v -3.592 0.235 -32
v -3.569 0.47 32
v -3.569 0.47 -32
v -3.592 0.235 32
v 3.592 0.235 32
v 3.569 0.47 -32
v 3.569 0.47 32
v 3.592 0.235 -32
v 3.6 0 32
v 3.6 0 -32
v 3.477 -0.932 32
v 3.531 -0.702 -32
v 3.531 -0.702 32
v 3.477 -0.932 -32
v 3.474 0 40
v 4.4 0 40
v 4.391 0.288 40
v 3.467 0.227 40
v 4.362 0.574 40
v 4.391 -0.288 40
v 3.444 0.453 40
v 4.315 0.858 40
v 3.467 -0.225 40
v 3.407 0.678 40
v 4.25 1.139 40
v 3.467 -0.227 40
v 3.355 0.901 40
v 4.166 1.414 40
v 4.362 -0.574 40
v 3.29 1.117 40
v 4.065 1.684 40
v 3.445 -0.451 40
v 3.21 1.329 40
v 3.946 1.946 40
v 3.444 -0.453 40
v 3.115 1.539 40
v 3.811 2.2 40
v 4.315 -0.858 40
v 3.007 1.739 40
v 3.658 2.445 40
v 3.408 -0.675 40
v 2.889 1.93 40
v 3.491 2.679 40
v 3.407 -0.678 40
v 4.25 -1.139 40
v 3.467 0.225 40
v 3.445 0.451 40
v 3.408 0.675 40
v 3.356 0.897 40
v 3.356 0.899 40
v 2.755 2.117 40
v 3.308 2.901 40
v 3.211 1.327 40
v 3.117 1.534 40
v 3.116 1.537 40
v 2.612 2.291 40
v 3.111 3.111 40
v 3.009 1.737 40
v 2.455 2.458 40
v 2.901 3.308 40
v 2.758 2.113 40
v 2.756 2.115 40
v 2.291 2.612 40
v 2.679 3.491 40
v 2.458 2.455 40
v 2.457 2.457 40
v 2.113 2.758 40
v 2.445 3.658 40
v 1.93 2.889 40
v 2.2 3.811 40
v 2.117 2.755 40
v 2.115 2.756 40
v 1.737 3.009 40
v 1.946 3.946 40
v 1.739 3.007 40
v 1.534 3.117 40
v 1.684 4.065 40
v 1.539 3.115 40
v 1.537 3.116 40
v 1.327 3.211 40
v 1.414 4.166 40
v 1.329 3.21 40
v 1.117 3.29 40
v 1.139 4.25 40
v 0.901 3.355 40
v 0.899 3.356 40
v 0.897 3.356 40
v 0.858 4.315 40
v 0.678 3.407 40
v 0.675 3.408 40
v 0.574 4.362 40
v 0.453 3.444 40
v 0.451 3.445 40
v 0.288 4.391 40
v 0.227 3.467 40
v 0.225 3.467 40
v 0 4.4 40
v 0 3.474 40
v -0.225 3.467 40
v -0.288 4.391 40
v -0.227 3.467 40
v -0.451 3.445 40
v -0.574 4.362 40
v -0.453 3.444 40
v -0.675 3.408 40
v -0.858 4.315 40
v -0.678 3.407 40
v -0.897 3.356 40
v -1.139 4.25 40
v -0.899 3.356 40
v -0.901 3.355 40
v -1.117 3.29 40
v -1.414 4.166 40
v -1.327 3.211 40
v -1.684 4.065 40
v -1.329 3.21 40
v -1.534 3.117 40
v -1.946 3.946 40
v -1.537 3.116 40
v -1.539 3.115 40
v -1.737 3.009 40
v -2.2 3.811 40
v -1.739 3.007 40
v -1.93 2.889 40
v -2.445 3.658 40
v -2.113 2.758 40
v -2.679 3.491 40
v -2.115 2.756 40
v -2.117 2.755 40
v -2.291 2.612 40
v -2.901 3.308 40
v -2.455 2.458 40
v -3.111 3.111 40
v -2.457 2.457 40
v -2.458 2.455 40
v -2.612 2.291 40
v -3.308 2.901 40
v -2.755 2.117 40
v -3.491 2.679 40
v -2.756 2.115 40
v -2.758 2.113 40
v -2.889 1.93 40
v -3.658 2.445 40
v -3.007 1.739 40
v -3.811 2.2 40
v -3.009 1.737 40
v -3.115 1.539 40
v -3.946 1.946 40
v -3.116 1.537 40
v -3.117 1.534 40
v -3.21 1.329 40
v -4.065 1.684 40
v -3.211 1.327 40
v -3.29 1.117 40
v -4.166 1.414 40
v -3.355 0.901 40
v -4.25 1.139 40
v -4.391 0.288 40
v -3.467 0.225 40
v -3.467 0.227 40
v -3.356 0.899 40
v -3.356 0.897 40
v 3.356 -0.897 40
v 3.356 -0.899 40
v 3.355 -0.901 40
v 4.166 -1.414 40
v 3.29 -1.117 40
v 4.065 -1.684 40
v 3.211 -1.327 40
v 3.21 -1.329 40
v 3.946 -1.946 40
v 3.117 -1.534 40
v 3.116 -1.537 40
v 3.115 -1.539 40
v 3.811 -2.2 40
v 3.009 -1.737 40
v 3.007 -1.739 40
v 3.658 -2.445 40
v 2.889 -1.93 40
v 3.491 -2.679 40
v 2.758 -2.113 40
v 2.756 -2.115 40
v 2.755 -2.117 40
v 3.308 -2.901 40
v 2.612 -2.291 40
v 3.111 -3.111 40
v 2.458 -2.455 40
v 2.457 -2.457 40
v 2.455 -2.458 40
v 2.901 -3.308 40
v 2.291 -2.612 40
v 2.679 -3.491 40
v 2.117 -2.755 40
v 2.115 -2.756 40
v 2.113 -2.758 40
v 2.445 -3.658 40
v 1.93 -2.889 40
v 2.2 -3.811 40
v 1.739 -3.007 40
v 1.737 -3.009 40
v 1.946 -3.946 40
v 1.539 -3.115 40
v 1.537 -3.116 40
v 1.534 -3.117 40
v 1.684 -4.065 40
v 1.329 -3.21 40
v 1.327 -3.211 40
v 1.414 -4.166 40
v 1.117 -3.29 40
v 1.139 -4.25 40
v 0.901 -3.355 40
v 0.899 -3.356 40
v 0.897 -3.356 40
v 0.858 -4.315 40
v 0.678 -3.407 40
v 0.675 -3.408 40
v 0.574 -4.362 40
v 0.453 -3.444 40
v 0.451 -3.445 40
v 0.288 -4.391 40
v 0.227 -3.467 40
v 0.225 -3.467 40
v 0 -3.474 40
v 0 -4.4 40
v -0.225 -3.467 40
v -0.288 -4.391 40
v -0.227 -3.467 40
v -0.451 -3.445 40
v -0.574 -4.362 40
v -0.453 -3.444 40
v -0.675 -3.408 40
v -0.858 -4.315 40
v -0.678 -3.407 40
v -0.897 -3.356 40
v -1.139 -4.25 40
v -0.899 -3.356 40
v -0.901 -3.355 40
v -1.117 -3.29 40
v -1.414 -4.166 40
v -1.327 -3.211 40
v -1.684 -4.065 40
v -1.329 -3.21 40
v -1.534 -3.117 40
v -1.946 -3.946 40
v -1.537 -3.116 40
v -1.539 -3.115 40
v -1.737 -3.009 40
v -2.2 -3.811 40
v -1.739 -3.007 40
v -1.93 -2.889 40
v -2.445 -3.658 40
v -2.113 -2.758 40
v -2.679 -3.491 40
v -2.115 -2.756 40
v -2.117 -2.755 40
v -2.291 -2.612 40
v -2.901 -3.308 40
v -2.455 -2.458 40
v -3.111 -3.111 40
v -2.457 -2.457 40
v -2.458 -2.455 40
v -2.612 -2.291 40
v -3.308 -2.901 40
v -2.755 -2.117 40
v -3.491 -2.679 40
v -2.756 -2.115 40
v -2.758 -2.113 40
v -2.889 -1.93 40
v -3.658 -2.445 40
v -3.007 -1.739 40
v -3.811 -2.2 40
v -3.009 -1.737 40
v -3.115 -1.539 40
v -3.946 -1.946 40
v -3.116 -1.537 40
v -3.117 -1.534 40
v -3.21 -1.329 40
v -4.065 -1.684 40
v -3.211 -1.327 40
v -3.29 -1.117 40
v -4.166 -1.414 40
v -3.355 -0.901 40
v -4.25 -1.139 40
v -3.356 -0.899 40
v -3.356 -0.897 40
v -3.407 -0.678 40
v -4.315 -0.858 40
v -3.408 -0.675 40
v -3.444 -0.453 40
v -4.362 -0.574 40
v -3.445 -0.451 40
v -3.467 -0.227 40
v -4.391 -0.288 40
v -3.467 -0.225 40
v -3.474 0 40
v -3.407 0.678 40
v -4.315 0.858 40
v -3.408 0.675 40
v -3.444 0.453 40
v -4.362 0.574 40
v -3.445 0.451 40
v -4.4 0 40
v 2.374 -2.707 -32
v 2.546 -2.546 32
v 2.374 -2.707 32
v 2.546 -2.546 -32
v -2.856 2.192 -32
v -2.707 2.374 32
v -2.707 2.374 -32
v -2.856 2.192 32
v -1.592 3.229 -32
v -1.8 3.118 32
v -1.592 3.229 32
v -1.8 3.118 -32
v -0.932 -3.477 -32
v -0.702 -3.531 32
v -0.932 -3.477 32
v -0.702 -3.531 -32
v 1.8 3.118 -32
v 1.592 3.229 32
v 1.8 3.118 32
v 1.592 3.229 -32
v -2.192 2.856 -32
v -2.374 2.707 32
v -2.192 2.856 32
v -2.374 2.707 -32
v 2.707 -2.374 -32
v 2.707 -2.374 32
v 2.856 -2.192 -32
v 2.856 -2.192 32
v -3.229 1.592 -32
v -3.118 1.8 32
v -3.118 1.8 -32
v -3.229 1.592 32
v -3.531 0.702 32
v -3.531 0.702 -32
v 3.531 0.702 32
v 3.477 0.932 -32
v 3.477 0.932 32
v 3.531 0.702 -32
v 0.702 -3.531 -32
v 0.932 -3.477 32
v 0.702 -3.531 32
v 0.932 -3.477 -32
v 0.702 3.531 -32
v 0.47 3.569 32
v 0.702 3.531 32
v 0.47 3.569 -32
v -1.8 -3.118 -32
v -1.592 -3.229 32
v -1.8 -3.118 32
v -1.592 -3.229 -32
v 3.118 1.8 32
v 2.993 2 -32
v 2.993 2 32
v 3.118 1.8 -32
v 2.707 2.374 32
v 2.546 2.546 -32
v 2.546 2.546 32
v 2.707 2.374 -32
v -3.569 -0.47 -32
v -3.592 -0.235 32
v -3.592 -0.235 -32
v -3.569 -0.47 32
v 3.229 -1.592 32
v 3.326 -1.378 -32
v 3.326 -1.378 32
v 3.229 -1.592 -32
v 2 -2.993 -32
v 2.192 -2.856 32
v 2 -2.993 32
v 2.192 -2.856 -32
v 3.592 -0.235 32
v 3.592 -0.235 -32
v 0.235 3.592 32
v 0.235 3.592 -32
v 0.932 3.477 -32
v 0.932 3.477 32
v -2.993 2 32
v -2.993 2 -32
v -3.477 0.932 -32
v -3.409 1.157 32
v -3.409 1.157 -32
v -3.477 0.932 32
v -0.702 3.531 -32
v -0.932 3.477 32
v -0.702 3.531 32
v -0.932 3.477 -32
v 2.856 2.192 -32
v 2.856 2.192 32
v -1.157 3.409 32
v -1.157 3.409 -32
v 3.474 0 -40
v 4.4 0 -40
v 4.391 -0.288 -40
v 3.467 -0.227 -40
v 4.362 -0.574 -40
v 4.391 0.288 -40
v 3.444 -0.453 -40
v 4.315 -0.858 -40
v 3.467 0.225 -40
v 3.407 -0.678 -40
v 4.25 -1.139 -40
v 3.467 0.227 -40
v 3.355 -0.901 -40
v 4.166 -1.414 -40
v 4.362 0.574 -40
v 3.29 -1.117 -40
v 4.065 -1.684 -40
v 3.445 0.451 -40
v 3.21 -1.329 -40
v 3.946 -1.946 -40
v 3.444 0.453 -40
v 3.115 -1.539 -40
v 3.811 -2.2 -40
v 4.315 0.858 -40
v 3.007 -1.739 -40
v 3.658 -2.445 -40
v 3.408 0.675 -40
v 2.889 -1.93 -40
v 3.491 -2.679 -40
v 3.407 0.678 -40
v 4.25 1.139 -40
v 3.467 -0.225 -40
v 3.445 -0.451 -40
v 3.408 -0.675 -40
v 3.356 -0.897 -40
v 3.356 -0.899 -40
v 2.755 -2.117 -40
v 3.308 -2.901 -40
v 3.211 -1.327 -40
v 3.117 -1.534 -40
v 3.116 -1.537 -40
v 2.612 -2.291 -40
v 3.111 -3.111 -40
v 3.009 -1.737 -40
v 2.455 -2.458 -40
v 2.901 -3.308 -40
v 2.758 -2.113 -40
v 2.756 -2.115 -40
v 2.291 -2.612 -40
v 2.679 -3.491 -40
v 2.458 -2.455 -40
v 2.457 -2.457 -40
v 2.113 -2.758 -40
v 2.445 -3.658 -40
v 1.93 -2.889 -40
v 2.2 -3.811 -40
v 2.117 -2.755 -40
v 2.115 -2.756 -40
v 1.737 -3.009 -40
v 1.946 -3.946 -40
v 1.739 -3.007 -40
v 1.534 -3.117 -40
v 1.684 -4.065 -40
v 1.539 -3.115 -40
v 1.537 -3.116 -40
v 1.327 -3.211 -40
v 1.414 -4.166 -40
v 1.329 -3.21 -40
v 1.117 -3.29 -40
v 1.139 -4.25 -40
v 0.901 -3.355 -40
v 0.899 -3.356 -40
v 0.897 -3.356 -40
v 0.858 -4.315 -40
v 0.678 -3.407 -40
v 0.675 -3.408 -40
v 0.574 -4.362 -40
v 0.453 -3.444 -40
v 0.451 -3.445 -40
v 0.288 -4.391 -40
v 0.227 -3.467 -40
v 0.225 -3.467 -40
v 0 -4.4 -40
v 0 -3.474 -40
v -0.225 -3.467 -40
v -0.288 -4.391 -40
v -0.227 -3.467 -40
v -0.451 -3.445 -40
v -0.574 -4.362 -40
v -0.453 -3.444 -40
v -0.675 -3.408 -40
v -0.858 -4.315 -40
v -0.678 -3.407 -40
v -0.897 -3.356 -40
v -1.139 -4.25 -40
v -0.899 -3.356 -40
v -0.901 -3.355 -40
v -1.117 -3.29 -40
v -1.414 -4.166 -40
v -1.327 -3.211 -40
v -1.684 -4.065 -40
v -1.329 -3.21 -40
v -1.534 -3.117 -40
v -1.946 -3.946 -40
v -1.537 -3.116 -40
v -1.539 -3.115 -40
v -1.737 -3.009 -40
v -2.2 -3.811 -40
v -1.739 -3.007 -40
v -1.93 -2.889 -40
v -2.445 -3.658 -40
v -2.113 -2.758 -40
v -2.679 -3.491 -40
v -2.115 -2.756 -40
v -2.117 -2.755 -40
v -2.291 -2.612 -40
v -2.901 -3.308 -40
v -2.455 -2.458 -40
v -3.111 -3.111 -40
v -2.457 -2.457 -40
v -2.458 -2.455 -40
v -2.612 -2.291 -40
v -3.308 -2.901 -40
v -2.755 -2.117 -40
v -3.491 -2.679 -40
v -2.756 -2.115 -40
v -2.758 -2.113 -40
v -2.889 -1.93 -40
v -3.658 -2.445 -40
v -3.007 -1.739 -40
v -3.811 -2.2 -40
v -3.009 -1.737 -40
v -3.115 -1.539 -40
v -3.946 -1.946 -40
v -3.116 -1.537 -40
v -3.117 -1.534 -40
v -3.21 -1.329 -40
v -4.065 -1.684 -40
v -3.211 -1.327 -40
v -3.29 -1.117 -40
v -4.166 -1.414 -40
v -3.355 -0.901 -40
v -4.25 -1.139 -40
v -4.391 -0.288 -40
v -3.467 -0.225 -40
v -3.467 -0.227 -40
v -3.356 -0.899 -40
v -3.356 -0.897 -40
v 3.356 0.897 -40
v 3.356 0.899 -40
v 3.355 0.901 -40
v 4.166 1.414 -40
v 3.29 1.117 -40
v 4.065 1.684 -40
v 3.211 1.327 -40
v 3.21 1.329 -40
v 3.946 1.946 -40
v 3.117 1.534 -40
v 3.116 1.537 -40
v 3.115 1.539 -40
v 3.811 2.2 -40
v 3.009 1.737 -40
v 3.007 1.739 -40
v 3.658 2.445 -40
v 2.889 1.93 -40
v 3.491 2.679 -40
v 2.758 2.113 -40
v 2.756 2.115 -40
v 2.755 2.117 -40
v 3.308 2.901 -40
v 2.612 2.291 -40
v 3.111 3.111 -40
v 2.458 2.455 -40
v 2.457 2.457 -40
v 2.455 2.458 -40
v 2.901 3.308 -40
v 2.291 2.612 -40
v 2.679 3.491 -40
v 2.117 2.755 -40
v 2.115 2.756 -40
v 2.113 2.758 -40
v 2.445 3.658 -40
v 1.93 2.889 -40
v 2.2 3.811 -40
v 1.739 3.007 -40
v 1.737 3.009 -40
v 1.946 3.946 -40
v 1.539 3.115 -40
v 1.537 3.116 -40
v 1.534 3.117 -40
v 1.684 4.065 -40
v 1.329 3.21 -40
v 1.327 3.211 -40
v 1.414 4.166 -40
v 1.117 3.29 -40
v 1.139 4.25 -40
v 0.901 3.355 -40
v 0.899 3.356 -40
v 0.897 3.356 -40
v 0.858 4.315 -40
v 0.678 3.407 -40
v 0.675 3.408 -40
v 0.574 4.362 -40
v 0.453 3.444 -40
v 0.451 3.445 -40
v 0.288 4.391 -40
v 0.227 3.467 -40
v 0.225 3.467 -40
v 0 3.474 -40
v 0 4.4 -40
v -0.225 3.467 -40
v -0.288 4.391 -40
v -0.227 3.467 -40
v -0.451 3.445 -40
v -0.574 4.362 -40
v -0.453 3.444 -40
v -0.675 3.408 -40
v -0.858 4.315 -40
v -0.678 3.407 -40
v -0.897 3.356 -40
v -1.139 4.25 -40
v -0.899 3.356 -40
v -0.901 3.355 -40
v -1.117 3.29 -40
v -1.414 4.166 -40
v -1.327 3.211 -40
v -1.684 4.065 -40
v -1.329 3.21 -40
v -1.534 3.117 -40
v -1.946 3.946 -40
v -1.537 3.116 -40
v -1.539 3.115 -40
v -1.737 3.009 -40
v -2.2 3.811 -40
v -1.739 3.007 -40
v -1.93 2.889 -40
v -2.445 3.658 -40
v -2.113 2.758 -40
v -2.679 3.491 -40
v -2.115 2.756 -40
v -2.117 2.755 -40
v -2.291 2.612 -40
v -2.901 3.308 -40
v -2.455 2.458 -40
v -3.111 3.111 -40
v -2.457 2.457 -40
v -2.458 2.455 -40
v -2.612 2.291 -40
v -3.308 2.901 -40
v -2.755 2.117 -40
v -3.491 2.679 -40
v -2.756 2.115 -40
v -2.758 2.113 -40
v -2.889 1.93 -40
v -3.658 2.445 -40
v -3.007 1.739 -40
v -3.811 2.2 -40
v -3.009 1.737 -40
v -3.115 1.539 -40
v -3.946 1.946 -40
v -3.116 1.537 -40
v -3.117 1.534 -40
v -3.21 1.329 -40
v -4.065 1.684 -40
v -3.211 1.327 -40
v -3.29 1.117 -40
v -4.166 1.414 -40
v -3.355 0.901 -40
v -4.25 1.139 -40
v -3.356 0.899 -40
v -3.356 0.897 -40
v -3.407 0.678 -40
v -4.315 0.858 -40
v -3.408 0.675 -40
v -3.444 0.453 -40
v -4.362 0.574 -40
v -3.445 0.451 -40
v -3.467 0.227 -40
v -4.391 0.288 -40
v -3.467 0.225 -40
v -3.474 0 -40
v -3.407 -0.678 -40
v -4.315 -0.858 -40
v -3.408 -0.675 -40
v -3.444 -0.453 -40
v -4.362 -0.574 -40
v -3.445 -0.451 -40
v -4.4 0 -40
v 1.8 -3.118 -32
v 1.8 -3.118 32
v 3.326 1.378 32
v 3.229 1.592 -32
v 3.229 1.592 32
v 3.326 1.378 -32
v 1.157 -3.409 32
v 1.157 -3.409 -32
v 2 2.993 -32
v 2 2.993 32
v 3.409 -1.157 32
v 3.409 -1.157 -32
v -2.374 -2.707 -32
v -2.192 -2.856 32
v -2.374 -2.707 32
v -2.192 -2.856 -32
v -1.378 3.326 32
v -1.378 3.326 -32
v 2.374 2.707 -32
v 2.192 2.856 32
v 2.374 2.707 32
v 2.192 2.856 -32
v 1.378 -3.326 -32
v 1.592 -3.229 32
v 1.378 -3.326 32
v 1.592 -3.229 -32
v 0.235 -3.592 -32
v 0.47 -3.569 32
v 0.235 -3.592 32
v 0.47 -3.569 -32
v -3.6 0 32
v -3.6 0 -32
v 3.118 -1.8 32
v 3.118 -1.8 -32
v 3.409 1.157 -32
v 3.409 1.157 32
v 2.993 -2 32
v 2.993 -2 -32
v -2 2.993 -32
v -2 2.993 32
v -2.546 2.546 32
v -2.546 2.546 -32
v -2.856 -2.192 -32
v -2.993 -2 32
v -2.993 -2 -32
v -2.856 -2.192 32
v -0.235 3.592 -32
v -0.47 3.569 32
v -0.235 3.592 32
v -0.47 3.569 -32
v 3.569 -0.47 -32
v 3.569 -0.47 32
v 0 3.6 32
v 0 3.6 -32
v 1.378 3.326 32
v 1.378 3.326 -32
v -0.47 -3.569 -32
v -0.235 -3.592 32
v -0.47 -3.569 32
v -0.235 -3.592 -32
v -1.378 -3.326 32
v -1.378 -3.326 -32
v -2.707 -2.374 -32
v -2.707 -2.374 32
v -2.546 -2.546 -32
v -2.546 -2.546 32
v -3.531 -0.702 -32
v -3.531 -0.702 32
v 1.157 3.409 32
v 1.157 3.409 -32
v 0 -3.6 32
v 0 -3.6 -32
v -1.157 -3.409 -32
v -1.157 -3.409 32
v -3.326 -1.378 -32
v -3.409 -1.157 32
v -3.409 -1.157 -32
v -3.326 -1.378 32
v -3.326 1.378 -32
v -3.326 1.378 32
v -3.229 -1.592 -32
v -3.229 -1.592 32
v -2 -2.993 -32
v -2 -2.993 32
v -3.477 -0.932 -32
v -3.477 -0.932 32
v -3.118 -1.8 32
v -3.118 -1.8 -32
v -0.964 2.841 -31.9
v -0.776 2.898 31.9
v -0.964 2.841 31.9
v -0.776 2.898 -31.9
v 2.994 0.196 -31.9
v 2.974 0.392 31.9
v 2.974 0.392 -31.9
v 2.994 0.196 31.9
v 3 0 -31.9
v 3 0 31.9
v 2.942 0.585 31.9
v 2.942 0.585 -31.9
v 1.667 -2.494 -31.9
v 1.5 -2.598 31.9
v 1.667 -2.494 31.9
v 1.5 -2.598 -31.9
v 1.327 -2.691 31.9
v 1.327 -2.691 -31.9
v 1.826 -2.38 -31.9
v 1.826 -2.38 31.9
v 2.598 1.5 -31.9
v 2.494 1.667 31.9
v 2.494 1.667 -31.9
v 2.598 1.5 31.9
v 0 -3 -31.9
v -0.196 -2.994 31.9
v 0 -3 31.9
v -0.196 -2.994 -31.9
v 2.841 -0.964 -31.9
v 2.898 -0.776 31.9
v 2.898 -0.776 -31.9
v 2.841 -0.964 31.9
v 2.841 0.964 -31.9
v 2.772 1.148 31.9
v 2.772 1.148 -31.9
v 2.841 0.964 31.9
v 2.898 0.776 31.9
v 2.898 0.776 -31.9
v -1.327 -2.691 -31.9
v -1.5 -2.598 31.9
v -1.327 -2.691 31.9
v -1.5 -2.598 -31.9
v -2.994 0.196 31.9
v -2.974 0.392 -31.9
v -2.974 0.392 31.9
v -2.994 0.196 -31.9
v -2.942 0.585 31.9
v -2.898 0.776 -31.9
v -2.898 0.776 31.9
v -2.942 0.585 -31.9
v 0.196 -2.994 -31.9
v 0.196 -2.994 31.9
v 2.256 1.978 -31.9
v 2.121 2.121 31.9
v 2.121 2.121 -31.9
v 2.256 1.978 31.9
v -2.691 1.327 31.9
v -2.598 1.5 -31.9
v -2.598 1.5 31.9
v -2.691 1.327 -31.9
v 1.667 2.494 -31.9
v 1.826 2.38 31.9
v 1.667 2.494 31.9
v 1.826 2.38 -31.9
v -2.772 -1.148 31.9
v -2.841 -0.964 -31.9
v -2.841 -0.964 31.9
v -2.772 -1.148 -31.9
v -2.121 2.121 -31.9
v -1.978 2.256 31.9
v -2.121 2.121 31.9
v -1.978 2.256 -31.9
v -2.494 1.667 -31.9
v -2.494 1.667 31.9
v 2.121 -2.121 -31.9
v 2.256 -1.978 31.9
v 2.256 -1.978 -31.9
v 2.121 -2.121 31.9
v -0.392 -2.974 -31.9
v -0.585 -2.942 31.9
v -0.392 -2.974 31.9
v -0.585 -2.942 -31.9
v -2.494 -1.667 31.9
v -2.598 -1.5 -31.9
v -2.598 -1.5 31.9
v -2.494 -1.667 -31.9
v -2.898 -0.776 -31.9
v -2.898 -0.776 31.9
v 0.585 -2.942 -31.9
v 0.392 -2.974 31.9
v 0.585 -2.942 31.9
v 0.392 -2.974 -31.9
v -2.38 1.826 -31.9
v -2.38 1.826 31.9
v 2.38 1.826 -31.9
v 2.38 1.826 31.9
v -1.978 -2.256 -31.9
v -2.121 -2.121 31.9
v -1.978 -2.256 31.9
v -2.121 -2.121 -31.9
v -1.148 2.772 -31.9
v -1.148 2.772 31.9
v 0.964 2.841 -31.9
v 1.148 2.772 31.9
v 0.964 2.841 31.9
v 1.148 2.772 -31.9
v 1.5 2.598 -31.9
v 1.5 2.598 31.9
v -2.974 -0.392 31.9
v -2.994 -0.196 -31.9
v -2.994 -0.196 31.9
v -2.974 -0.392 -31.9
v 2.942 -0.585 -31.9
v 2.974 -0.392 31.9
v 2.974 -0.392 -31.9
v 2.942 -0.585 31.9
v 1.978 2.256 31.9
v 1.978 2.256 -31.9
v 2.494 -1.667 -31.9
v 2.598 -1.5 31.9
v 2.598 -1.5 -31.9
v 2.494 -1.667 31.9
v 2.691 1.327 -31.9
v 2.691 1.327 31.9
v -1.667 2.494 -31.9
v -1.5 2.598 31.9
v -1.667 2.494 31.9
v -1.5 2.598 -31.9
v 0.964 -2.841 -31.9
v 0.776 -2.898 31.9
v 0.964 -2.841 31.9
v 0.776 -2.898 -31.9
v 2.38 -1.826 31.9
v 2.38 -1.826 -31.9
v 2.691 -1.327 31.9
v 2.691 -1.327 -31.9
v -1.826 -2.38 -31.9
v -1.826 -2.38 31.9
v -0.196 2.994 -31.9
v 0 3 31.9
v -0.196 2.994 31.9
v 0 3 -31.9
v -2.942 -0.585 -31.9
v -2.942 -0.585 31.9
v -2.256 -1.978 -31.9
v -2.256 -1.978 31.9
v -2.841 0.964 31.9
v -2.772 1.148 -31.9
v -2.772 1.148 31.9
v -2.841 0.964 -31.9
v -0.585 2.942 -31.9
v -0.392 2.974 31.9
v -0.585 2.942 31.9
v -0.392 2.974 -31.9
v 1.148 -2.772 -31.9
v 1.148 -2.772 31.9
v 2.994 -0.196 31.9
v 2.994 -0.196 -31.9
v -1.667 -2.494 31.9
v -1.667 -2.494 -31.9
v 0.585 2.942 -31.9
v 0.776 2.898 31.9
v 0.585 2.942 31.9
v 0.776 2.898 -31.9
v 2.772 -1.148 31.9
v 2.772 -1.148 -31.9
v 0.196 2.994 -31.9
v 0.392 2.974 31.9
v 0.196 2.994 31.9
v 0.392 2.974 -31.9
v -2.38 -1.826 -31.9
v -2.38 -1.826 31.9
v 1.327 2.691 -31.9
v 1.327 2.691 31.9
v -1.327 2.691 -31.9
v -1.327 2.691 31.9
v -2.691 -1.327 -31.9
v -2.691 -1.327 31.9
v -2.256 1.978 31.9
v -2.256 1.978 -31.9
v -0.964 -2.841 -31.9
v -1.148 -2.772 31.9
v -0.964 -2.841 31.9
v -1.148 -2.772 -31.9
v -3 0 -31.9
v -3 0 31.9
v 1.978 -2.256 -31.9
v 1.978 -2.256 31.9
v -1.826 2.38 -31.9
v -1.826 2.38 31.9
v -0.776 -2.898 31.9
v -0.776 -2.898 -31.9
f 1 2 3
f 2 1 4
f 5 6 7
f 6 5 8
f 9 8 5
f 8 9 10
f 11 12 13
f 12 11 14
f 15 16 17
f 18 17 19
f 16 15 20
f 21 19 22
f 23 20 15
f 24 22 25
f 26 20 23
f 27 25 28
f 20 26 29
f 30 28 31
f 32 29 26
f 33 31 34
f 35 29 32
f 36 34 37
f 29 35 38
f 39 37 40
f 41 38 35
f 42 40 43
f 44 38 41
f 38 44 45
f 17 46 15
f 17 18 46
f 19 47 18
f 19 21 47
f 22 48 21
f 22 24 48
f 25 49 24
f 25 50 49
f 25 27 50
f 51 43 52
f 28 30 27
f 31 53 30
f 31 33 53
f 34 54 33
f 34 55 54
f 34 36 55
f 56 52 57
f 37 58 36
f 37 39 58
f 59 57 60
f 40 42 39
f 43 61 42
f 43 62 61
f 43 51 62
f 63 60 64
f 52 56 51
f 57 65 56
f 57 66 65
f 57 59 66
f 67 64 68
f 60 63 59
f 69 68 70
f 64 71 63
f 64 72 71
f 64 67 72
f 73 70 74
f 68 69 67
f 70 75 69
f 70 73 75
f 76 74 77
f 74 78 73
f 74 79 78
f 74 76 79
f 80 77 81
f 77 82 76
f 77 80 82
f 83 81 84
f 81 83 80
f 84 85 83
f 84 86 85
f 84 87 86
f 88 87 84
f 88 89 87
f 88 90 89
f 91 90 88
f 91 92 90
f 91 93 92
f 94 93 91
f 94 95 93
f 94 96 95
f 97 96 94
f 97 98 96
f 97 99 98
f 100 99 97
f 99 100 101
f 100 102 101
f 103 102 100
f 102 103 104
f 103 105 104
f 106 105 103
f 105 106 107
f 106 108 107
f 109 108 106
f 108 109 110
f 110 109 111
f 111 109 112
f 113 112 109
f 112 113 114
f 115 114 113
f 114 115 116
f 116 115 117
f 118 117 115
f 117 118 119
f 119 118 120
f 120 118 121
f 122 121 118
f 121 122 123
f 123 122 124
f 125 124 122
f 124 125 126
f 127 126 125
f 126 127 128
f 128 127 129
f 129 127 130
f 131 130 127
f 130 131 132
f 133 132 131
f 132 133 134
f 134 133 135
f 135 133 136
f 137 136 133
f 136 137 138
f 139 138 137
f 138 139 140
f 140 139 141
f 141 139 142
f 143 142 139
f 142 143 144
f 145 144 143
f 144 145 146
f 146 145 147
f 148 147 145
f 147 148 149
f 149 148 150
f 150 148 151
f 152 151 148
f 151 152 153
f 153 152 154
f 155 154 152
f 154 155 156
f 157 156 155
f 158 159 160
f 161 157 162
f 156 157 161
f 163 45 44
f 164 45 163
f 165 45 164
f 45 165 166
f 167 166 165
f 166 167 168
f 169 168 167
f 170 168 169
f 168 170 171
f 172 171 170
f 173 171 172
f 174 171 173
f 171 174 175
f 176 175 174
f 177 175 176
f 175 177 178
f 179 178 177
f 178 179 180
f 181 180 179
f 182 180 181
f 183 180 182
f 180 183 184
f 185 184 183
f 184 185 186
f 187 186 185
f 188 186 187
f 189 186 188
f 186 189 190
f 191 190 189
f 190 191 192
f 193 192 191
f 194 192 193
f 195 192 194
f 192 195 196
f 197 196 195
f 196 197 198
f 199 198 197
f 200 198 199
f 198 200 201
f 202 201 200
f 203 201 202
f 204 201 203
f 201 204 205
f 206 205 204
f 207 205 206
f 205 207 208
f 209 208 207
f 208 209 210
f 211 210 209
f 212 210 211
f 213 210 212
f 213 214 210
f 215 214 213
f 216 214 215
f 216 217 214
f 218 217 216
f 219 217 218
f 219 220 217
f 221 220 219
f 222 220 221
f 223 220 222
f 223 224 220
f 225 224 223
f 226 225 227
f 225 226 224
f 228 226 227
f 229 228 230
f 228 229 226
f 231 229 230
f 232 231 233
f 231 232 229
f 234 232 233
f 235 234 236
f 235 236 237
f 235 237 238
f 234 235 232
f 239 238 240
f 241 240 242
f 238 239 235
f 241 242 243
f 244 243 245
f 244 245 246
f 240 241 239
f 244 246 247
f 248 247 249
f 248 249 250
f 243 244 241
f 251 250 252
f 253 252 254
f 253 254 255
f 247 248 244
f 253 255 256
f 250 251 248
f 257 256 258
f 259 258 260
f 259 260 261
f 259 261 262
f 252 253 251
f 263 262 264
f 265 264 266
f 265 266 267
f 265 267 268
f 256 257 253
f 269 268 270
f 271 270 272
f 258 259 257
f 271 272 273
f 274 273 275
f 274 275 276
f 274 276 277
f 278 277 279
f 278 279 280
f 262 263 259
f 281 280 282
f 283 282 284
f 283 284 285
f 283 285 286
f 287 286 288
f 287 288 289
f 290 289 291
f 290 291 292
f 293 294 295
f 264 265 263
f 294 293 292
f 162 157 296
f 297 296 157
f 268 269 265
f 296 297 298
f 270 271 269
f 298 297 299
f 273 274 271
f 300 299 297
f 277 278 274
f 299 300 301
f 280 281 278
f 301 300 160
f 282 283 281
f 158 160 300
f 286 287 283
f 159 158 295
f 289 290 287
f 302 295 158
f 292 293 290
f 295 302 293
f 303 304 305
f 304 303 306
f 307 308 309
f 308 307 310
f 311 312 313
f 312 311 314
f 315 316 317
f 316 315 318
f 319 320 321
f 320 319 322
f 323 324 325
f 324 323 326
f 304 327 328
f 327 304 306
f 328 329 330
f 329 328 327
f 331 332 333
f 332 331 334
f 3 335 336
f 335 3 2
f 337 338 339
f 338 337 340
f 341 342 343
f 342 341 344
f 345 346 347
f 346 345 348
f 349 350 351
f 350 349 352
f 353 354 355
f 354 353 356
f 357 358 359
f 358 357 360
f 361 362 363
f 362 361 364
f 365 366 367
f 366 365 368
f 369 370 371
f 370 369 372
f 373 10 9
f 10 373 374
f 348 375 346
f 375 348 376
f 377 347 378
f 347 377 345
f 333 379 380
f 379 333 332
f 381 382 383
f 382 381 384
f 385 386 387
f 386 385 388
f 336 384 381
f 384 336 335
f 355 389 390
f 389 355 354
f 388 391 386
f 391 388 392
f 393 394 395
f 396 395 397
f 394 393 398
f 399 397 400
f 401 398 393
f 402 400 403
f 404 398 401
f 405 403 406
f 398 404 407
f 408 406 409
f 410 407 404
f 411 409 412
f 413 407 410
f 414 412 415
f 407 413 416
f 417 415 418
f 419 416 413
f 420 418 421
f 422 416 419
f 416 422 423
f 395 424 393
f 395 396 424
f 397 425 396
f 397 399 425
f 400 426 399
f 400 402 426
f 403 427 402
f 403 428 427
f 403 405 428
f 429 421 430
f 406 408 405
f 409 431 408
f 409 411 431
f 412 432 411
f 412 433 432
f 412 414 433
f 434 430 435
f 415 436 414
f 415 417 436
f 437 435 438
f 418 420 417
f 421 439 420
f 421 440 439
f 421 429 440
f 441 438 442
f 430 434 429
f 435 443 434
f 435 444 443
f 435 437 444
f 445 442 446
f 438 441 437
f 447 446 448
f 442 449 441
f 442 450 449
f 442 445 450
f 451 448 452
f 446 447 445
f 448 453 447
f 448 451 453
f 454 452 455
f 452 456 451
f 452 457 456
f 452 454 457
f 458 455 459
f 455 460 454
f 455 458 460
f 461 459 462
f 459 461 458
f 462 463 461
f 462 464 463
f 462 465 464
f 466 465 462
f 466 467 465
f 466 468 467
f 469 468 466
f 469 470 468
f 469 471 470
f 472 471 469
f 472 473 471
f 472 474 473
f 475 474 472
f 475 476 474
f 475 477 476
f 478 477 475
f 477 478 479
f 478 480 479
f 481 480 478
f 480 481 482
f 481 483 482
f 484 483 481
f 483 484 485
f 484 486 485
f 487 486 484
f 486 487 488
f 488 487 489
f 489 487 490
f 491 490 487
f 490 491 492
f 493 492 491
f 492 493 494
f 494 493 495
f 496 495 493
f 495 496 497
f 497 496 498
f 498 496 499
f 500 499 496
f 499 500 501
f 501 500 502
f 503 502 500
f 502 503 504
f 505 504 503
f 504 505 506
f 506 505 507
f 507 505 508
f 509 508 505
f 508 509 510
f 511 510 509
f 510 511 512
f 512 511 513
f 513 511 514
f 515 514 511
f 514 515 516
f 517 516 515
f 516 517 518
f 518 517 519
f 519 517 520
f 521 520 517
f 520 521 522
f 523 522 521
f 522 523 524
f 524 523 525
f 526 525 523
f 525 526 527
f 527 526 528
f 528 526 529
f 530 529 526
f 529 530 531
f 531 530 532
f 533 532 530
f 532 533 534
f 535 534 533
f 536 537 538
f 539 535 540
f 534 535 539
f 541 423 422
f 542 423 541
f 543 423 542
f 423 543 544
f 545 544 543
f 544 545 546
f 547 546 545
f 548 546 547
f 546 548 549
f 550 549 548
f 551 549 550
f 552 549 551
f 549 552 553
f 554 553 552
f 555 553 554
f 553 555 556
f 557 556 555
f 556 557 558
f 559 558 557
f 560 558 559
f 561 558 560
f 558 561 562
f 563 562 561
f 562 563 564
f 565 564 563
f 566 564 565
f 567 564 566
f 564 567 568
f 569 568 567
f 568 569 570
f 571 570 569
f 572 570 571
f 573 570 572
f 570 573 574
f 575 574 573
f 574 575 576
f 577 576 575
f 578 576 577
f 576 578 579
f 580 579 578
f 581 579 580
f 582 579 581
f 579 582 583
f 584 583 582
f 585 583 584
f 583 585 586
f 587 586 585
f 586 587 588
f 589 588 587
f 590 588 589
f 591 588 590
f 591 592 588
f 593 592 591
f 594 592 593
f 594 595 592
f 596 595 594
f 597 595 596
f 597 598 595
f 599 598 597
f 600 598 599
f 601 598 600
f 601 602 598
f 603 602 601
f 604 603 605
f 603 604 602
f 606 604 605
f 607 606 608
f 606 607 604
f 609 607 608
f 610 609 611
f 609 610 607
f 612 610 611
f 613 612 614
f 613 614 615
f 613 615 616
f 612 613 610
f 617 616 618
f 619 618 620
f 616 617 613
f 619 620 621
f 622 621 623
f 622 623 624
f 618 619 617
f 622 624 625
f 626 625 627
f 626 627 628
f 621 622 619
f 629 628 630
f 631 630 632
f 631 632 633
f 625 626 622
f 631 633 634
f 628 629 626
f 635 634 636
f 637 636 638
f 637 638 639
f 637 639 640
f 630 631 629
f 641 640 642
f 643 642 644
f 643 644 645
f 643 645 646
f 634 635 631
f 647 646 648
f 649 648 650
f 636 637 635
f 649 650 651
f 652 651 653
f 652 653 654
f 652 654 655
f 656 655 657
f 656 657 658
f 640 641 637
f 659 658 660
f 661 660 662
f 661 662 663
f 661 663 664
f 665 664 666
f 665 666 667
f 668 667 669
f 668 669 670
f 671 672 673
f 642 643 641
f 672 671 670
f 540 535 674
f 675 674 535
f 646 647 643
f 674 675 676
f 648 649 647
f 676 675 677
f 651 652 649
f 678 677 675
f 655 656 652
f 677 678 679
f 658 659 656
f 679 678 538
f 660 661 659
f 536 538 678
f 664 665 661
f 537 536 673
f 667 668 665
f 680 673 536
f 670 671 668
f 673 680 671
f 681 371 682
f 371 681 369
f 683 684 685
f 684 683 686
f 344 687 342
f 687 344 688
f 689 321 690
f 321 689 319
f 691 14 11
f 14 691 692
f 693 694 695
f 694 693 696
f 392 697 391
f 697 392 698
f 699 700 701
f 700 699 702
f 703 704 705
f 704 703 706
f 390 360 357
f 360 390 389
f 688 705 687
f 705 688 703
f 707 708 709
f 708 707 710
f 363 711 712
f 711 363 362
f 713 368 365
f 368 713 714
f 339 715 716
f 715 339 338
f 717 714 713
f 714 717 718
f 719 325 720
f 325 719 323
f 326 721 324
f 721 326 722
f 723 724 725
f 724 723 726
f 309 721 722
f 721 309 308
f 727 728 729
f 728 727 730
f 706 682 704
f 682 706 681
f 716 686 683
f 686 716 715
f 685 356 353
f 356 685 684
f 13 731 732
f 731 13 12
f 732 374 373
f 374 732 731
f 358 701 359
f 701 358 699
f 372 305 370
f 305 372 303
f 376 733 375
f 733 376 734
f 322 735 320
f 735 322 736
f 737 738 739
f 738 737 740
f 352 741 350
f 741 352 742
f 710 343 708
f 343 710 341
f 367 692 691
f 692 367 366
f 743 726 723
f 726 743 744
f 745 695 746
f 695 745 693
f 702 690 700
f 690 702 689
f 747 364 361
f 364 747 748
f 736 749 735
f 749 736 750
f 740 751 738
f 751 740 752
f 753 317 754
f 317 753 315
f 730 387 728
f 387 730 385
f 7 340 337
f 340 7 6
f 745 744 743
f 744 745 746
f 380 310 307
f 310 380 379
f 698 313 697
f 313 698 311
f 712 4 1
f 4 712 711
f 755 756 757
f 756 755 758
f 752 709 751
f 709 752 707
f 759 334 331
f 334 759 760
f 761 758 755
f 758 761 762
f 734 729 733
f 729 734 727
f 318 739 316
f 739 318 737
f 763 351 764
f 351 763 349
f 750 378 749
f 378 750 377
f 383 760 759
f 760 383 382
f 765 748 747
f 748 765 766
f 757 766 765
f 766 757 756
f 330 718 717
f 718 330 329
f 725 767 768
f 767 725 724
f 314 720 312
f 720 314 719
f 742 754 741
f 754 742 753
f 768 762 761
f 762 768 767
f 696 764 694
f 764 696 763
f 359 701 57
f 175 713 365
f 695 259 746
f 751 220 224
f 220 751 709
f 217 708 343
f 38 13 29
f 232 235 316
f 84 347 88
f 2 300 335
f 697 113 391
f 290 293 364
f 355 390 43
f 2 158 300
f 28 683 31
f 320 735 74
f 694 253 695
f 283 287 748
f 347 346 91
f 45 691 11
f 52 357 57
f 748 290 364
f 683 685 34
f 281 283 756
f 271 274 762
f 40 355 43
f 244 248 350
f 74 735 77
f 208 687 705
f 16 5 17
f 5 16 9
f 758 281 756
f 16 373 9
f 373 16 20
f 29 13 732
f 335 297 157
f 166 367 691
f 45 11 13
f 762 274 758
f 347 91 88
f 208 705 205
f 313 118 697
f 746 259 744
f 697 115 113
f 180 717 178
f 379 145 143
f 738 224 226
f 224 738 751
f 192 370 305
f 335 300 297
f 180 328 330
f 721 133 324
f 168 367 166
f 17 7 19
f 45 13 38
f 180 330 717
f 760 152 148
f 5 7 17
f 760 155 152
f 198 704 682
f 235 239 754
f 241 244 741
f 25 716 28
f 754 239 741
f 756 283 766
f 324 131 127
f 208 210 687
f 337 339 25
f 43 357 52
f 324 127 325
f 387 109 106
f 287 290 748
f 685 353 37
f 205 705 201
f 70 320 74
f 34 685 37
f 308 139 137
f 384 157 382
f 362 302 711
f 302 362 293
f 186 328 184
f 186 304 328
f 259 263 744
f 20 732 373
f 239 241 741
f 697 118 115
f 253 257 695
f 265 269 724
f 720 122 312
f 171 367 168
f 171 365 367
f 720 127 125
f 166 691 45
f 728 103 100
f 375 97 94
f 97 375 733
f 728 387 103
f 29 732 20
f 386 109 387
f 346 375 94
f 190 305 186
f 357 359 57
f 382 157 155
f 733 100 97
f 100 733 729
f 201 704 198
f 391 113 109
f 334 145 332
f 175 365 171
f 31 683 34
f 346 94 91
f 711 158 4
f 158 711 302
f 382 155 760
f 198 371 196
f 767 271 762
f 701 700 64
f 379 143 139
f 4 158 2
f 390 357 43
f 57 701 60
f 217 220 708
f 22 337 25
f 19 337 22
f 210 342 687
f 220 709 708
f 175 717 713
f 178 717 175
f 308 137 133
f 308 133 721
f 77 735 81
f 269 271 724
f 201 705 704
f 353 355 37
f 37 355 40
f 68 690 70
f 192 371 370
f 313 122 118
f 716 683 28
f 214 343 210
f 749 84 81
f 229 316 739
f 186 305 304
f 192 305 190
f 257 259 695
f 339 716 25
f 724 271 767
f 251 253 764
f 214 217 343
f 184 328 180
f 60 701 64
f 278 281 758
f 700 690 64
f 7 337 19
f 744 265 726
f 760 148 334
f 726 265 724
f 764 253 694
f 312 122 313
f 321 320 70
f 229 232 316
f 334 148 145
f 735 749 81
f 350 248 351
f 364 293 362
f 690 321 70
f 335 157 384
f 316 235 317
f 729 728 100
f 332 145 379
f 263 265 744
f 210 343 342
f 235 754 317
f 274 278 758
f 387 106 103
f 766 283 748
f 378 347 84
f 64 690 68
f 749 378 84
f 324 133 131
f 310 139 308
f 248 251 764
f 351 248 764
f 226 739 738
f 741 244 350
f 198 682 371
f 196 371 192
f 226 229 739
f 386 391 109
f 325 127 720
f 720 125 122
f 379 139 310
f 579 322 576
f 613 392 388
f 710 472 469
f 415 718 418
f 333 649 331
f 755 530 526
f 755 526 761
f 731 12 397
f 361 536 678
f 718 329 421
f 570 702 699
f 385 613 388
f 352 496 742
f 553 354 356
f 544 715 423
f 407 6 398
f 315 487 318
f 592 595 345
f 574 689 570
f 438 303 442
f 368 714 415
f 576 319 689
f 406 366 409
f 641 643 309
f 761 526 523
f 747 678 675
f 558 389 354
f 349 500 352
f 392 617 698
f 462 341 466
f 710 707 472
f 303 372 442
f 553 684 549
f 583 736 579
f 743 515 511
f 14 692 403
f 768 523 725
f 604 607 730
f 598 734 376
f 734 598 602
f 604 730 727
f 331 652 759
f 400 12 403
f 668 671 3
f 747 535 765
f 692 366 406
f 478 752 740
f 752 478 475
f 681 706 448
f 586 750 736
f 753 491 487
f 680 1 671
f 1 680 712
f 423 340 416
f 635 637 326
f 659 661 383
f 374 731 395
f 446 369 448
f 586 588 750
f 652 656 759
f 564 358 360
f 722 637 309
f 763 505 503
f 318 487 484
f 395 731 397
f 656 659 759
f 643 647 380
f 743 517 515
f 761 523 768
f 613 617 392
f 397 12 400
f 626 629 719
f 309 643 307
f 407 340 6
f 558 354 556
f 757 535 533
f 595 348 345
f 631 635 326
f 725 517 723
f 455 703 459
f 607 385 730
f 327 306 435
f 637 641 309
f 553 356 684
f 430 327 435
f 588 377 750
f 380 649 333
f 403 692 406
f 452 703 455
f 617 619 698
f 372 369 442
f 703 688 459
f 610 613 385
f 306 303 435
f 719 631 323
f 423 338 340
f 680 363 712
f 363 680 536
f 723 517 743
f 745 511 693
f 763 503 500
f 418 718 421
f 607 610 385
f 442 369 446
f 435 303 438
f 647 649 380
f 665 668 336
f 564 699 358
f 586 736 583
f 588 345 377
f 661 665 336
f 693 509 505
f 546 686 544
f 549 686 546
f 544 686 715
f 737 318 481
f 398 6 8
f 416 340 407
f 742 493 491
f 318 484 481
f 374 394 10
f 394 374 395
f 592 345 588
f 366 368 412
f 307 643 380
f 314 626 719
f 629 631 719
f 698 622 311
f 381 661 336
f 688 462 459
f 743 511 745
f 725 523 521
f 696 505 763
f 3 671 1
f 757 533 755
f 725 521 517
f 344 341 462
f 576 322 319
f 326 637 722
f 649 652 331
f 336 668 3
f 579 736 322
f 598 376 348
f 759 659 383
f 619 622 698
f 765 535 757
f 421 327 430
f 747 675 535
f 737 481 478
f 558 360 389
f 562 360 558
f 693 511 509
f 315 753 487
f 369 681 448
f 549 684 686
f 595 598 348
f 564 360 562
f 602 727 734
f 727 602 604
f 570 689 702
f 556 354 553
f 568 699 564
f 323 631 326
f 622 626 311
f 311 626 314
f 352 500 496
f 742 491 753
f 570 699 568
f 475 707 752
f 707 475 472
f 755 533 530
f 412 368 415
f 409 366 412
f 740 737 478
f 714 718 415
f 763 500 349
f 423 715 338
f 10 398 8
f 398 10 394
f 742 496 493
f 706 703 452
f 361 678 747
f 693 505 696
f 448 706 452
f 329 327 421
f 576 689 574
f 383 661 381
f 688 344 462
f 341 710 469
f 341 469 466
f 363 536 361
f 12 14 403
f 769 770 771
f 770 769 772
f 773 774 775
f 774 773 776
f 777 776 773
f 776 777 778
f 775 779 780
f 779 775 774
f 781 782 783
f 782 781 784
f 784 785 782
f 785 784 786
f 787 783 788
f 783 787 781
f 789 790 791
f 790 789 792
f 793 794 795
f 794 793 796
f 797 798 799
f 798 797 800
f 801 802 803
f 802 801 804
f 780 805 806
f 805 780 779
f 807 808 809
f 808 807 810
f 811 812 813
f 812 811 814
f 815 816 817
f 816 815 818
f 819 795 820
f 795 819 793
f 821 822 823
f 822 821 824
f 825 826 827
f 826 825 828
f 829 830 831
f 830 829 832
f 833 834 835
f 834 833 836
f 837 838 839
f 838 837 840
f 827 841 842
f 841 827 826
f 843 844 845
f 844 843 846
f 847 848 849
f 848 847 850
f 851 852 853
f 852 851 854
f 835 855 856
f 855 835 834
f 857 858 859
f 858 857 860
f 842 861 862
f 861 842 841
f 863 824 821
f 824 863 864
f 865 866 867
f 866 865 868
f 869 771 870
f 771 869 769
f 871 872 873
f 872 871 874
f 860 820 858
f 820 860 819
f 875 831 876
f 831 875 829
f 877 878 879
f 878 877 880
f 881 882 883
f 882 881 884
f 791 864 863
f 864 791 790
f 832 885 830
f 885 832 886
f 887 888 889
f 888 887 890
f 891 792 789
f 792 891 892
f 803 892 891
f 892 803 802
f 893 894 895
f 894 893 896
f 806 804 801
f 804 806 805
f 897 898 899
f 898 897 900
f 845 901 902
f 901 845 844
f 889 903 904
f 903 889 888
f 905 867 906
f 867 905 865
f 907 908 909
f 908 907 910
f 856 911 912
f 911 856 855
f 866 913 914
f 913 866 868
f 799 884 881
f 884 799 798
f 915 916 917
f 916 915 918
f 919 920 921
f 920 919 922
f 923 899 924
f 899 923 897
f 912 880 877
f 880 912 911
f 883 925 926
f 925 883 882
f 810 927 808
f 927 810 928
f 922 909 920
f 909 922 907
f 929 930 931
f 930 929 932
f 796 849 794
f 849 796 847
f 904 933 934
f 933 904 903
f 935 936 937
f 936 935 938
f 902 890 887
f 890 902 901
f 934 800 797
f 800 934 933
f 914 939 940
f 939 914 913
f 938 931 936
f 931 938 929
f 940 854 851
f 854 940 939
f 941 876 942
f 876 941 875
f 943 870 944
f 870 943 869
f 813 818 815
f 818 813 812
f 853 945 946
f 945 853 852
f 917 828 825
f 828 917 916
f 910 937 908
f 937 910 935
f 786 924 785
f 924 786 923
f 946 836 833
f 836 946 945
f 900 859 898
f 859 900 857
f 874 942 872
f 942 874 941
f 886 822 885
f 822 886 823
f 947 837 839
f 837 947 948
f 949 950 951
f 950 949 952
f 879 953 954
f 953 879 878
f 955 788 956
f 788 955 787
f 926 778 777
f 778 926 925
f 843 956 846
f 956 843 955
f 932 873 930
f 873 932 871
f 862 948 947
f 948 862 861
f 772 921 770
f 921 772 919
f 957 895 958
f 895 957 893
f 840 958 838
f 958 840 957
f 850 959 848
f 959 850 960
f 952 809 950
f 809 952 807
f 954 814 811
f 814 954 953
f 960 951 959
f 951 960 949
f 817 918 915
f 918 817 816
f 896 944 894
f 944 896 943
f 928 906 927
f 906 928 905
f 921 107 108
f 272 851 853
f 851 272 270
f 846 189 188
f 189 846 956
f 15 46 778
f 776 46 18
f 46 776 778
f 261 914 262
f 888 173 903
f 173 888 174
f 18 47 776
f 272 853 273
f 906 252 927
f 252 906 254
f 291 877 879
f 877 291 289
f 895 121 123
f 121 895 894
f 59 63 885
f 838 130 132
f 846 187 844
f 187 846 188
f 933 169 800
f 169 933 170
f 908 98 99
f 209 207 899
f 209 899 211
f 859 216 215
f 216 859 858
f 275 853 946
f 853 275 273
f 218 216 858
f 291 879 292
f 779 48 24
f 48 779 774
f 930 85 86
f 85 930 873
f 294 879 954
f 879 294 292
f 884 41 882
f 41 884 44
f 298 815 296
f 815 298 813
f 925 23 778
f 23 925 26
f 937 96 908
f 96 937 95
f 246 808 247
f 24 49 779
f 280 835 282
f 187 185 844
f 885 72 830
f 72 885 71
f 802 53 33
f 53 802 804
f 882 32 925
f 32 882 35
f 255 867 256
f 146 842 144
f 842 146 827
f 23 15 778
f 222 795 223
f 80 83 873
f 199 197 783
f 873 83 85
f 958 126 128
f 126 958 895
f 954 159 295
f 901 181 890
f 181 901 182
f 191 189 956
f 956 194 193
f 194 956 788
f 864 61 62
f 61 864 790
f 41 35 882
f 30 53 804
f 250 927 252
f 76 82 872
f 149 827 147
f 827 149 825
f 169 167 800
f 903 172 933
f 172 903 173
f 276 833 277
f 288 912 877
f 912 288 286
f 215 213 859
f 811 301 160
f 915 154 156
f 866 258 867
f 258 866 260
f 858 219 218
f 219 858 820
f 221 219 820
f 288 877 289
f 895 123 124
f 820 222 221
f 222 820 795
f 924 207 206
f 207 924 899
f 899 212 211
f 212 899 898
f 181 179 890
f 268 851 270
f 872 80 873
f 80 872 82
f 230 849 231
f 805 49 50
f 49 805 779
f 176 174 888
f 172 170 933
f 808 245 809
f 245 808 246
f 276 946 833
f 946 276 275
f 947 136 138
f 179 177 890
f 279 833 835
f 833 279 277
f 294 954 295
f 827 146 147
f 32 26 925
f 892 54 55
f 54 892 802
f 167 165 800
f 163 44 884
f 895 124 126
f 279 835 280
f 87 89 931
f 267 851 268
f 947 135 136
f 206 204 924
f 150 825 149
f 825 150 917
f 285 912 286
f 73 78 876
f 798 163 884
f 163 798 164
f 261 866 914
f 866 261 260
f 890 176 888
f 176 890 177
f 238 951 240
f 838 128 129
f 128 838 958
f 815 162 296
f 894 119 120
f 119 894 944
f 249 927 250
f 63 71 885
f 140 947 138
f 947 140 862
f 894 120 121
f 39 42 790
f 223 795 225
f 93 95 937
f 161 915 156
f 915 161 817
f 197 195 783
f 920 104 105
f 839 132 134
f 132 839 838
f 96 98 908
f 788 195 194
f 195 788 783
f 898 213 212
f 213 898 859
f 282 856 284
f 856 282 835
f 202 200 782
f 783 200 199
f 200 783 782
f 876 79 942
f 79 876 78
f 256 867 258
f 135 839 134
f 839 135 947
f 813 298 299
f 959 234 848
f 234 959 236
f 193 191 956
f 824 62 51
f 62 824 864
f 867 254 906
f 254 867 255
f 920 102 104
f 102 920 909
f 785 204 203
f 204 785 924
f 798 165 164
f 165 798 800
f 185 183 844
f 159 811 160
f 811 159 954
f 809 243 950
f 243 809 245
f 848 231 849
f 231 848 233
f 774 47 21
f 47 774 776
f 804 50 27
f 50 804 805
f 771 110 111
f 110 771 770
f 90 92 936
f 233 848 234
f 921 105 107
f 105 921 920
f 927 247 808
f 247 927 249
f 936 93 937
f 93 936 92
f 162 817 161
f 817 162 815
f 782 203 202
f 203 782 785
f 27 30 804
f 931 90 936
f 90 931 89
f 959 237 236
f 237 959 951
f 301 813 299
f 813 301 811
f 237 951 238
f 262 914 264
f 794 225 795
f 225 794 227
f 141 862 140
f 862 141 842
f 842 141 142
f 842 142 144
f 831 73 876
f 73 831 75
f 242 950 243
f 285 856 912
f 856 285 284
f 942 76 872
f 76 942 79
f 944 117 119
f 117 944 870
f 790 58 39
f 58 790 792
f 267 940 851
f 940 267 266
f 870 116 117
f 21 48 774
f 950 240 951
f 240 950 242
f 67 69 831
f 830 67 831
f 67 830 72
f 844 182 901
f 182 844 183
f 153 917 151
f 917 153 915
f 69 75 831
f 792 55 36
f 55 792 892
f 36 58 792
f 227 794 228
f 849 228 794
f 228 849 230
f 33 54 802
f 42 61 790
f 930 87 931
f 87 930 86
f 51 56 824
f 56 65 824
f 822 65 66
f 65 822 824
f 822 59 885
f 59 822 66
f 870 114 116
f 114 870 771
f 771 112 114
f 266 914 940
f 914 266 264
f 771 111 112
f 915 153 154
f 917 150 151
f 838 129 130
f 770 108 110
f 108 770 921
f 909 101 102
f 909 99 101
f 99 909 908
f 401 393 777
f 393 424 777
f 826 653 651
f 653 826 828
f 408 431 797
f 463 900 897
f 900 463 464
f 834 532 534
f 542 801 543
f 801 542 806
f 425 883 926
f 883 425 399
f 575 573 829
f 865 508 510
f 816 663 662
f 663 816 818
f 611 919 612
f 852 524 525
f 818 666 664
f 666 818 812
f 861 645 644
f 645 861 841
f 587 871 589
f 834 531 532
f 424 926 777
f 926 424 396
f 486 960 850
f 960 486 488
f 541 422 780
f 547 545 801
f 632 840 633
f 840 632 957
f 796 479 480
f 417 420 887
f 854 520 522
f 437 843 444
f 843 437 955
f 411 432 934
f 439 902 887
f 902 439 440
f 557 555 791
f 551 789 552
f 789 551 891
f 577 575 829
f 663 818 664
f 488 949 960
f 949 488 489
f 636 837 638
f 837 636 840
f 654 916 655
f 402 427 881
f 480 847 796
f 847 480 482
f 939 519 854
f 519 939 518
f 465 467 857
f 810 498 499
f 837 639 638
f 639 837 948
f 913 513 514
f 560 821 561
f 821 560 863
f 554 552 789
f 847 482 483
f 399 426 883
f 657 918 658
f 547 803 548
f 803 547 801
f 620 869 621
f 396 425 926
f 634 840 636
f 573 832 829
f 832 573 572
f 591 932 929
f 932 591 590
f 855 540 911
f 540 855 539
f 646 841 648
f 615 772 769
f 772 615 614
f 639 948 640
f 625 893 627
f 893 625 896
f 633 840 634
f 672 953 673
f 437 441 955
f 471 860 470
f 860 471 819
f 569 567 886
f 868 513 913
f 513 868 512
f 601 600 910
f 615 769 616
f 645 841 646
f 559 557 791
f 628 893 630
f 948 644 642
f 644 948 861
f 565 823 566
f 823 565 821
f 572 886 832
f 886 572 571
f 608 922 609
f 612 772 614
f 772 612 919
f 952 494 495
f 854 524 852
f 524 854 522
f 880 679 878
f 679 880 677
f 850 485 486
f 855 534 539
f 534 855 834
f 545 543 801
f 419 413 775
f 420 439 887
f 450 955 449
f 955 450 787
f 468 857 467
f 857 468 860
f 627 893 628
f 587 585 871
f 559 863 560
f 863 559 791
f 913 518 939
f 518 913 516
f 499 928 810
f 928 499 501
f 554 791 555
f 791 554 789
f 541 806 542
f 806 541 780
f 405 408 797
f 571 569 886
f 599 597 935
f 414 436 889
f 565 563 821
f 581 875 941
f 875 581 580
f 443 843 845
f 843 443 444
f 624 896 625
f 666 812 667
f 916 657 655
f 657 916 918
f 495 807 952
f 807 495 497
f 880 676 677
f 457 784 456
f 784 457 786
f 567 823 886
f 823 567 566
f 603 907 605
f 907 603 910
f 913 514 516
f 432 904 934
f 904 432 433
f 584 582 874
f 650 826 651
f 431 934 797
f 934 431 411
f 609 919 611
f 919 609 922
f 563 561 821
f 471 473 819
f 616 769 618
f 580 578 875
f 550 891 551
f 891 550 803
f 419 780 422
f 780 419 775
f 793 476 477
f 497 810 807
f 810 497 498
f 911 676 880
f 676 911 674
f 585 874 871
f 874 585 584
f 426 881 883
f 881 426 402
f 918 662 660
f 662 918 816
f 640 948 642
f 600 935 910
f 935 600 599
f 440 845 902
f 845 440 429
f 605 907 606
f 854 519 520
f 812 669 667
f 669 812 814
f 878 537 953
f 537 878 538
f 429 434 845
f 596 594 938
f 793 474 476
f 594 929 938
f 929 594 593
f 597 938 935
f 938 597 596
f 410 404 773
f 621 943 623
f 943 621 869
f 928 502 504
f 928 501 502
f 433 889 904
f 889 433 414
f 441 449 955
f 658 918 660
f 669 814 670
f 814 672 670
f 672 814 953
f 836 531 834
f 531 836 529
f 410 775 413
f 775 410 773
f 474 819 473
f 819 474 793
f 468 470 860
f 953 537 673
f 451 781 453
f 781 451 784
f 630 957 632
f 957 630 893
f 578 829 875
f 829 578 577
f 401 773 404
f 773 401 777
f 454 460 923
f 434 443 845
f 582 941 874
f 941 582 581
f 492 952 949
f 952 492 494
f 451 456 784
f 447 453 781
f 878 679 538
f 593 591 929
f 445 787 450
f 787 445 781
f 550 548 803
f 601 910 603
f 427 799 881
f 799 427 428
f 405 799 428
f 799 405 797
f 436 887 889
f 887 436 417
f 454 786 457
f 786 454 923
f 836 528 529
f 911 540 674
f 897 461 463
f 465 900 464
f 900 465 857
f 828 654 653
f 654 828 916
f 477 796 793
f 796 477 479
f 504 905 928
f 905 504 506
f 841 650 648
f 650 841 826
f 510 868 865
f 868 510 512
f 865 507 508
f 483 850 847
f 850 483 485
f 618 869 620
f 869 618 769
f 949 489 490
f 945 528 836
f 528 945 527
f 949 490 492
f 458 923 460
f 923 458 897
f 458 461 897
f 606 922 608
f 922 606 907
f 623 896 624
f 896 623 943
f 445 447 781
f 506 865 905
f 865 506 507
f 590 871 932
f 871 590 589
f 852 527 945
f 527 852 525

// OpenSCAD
$fn=96;

module ptfe_heatshrink_sleeve(len=60, id=4, wall=0.5, flare=0.6, flare_len=6) {
    od = id + 2*wall;
    od_flare = od + 2*flare;
    id_flare = id + 2*flare*0.6;

    difference() {
        union() {
            cylinder(h=len, d=od, center=true);
            translate([0,0, len/2 - flare_len/2])
                cylinder(h=flare_len, d1=od, d2=od_flare, center=true);
            translate([0,0,-len/2 + flare_len/2])
                cylinder(h=flare_len, d1=od_flare, d2=od, center=true);
        }
        union() {
            cylinder(h=len+0.2, d=id, center=true);
            translate([0,0, len/2 - flare_len/2])
                cylinder(h=flare_len+0.2, d1=id, d2=id_flare, center=true);
            translate([0,0,-len/2 + flare_len/2])
                cylinder(h=flare_len+0.2, d1=id_flare, d2=id, center=true);
        }
    }
}

ptfe_heatshrink_sleeve(len=80, id=6, wall=0.6, flare=0.8, flare_len=8);
